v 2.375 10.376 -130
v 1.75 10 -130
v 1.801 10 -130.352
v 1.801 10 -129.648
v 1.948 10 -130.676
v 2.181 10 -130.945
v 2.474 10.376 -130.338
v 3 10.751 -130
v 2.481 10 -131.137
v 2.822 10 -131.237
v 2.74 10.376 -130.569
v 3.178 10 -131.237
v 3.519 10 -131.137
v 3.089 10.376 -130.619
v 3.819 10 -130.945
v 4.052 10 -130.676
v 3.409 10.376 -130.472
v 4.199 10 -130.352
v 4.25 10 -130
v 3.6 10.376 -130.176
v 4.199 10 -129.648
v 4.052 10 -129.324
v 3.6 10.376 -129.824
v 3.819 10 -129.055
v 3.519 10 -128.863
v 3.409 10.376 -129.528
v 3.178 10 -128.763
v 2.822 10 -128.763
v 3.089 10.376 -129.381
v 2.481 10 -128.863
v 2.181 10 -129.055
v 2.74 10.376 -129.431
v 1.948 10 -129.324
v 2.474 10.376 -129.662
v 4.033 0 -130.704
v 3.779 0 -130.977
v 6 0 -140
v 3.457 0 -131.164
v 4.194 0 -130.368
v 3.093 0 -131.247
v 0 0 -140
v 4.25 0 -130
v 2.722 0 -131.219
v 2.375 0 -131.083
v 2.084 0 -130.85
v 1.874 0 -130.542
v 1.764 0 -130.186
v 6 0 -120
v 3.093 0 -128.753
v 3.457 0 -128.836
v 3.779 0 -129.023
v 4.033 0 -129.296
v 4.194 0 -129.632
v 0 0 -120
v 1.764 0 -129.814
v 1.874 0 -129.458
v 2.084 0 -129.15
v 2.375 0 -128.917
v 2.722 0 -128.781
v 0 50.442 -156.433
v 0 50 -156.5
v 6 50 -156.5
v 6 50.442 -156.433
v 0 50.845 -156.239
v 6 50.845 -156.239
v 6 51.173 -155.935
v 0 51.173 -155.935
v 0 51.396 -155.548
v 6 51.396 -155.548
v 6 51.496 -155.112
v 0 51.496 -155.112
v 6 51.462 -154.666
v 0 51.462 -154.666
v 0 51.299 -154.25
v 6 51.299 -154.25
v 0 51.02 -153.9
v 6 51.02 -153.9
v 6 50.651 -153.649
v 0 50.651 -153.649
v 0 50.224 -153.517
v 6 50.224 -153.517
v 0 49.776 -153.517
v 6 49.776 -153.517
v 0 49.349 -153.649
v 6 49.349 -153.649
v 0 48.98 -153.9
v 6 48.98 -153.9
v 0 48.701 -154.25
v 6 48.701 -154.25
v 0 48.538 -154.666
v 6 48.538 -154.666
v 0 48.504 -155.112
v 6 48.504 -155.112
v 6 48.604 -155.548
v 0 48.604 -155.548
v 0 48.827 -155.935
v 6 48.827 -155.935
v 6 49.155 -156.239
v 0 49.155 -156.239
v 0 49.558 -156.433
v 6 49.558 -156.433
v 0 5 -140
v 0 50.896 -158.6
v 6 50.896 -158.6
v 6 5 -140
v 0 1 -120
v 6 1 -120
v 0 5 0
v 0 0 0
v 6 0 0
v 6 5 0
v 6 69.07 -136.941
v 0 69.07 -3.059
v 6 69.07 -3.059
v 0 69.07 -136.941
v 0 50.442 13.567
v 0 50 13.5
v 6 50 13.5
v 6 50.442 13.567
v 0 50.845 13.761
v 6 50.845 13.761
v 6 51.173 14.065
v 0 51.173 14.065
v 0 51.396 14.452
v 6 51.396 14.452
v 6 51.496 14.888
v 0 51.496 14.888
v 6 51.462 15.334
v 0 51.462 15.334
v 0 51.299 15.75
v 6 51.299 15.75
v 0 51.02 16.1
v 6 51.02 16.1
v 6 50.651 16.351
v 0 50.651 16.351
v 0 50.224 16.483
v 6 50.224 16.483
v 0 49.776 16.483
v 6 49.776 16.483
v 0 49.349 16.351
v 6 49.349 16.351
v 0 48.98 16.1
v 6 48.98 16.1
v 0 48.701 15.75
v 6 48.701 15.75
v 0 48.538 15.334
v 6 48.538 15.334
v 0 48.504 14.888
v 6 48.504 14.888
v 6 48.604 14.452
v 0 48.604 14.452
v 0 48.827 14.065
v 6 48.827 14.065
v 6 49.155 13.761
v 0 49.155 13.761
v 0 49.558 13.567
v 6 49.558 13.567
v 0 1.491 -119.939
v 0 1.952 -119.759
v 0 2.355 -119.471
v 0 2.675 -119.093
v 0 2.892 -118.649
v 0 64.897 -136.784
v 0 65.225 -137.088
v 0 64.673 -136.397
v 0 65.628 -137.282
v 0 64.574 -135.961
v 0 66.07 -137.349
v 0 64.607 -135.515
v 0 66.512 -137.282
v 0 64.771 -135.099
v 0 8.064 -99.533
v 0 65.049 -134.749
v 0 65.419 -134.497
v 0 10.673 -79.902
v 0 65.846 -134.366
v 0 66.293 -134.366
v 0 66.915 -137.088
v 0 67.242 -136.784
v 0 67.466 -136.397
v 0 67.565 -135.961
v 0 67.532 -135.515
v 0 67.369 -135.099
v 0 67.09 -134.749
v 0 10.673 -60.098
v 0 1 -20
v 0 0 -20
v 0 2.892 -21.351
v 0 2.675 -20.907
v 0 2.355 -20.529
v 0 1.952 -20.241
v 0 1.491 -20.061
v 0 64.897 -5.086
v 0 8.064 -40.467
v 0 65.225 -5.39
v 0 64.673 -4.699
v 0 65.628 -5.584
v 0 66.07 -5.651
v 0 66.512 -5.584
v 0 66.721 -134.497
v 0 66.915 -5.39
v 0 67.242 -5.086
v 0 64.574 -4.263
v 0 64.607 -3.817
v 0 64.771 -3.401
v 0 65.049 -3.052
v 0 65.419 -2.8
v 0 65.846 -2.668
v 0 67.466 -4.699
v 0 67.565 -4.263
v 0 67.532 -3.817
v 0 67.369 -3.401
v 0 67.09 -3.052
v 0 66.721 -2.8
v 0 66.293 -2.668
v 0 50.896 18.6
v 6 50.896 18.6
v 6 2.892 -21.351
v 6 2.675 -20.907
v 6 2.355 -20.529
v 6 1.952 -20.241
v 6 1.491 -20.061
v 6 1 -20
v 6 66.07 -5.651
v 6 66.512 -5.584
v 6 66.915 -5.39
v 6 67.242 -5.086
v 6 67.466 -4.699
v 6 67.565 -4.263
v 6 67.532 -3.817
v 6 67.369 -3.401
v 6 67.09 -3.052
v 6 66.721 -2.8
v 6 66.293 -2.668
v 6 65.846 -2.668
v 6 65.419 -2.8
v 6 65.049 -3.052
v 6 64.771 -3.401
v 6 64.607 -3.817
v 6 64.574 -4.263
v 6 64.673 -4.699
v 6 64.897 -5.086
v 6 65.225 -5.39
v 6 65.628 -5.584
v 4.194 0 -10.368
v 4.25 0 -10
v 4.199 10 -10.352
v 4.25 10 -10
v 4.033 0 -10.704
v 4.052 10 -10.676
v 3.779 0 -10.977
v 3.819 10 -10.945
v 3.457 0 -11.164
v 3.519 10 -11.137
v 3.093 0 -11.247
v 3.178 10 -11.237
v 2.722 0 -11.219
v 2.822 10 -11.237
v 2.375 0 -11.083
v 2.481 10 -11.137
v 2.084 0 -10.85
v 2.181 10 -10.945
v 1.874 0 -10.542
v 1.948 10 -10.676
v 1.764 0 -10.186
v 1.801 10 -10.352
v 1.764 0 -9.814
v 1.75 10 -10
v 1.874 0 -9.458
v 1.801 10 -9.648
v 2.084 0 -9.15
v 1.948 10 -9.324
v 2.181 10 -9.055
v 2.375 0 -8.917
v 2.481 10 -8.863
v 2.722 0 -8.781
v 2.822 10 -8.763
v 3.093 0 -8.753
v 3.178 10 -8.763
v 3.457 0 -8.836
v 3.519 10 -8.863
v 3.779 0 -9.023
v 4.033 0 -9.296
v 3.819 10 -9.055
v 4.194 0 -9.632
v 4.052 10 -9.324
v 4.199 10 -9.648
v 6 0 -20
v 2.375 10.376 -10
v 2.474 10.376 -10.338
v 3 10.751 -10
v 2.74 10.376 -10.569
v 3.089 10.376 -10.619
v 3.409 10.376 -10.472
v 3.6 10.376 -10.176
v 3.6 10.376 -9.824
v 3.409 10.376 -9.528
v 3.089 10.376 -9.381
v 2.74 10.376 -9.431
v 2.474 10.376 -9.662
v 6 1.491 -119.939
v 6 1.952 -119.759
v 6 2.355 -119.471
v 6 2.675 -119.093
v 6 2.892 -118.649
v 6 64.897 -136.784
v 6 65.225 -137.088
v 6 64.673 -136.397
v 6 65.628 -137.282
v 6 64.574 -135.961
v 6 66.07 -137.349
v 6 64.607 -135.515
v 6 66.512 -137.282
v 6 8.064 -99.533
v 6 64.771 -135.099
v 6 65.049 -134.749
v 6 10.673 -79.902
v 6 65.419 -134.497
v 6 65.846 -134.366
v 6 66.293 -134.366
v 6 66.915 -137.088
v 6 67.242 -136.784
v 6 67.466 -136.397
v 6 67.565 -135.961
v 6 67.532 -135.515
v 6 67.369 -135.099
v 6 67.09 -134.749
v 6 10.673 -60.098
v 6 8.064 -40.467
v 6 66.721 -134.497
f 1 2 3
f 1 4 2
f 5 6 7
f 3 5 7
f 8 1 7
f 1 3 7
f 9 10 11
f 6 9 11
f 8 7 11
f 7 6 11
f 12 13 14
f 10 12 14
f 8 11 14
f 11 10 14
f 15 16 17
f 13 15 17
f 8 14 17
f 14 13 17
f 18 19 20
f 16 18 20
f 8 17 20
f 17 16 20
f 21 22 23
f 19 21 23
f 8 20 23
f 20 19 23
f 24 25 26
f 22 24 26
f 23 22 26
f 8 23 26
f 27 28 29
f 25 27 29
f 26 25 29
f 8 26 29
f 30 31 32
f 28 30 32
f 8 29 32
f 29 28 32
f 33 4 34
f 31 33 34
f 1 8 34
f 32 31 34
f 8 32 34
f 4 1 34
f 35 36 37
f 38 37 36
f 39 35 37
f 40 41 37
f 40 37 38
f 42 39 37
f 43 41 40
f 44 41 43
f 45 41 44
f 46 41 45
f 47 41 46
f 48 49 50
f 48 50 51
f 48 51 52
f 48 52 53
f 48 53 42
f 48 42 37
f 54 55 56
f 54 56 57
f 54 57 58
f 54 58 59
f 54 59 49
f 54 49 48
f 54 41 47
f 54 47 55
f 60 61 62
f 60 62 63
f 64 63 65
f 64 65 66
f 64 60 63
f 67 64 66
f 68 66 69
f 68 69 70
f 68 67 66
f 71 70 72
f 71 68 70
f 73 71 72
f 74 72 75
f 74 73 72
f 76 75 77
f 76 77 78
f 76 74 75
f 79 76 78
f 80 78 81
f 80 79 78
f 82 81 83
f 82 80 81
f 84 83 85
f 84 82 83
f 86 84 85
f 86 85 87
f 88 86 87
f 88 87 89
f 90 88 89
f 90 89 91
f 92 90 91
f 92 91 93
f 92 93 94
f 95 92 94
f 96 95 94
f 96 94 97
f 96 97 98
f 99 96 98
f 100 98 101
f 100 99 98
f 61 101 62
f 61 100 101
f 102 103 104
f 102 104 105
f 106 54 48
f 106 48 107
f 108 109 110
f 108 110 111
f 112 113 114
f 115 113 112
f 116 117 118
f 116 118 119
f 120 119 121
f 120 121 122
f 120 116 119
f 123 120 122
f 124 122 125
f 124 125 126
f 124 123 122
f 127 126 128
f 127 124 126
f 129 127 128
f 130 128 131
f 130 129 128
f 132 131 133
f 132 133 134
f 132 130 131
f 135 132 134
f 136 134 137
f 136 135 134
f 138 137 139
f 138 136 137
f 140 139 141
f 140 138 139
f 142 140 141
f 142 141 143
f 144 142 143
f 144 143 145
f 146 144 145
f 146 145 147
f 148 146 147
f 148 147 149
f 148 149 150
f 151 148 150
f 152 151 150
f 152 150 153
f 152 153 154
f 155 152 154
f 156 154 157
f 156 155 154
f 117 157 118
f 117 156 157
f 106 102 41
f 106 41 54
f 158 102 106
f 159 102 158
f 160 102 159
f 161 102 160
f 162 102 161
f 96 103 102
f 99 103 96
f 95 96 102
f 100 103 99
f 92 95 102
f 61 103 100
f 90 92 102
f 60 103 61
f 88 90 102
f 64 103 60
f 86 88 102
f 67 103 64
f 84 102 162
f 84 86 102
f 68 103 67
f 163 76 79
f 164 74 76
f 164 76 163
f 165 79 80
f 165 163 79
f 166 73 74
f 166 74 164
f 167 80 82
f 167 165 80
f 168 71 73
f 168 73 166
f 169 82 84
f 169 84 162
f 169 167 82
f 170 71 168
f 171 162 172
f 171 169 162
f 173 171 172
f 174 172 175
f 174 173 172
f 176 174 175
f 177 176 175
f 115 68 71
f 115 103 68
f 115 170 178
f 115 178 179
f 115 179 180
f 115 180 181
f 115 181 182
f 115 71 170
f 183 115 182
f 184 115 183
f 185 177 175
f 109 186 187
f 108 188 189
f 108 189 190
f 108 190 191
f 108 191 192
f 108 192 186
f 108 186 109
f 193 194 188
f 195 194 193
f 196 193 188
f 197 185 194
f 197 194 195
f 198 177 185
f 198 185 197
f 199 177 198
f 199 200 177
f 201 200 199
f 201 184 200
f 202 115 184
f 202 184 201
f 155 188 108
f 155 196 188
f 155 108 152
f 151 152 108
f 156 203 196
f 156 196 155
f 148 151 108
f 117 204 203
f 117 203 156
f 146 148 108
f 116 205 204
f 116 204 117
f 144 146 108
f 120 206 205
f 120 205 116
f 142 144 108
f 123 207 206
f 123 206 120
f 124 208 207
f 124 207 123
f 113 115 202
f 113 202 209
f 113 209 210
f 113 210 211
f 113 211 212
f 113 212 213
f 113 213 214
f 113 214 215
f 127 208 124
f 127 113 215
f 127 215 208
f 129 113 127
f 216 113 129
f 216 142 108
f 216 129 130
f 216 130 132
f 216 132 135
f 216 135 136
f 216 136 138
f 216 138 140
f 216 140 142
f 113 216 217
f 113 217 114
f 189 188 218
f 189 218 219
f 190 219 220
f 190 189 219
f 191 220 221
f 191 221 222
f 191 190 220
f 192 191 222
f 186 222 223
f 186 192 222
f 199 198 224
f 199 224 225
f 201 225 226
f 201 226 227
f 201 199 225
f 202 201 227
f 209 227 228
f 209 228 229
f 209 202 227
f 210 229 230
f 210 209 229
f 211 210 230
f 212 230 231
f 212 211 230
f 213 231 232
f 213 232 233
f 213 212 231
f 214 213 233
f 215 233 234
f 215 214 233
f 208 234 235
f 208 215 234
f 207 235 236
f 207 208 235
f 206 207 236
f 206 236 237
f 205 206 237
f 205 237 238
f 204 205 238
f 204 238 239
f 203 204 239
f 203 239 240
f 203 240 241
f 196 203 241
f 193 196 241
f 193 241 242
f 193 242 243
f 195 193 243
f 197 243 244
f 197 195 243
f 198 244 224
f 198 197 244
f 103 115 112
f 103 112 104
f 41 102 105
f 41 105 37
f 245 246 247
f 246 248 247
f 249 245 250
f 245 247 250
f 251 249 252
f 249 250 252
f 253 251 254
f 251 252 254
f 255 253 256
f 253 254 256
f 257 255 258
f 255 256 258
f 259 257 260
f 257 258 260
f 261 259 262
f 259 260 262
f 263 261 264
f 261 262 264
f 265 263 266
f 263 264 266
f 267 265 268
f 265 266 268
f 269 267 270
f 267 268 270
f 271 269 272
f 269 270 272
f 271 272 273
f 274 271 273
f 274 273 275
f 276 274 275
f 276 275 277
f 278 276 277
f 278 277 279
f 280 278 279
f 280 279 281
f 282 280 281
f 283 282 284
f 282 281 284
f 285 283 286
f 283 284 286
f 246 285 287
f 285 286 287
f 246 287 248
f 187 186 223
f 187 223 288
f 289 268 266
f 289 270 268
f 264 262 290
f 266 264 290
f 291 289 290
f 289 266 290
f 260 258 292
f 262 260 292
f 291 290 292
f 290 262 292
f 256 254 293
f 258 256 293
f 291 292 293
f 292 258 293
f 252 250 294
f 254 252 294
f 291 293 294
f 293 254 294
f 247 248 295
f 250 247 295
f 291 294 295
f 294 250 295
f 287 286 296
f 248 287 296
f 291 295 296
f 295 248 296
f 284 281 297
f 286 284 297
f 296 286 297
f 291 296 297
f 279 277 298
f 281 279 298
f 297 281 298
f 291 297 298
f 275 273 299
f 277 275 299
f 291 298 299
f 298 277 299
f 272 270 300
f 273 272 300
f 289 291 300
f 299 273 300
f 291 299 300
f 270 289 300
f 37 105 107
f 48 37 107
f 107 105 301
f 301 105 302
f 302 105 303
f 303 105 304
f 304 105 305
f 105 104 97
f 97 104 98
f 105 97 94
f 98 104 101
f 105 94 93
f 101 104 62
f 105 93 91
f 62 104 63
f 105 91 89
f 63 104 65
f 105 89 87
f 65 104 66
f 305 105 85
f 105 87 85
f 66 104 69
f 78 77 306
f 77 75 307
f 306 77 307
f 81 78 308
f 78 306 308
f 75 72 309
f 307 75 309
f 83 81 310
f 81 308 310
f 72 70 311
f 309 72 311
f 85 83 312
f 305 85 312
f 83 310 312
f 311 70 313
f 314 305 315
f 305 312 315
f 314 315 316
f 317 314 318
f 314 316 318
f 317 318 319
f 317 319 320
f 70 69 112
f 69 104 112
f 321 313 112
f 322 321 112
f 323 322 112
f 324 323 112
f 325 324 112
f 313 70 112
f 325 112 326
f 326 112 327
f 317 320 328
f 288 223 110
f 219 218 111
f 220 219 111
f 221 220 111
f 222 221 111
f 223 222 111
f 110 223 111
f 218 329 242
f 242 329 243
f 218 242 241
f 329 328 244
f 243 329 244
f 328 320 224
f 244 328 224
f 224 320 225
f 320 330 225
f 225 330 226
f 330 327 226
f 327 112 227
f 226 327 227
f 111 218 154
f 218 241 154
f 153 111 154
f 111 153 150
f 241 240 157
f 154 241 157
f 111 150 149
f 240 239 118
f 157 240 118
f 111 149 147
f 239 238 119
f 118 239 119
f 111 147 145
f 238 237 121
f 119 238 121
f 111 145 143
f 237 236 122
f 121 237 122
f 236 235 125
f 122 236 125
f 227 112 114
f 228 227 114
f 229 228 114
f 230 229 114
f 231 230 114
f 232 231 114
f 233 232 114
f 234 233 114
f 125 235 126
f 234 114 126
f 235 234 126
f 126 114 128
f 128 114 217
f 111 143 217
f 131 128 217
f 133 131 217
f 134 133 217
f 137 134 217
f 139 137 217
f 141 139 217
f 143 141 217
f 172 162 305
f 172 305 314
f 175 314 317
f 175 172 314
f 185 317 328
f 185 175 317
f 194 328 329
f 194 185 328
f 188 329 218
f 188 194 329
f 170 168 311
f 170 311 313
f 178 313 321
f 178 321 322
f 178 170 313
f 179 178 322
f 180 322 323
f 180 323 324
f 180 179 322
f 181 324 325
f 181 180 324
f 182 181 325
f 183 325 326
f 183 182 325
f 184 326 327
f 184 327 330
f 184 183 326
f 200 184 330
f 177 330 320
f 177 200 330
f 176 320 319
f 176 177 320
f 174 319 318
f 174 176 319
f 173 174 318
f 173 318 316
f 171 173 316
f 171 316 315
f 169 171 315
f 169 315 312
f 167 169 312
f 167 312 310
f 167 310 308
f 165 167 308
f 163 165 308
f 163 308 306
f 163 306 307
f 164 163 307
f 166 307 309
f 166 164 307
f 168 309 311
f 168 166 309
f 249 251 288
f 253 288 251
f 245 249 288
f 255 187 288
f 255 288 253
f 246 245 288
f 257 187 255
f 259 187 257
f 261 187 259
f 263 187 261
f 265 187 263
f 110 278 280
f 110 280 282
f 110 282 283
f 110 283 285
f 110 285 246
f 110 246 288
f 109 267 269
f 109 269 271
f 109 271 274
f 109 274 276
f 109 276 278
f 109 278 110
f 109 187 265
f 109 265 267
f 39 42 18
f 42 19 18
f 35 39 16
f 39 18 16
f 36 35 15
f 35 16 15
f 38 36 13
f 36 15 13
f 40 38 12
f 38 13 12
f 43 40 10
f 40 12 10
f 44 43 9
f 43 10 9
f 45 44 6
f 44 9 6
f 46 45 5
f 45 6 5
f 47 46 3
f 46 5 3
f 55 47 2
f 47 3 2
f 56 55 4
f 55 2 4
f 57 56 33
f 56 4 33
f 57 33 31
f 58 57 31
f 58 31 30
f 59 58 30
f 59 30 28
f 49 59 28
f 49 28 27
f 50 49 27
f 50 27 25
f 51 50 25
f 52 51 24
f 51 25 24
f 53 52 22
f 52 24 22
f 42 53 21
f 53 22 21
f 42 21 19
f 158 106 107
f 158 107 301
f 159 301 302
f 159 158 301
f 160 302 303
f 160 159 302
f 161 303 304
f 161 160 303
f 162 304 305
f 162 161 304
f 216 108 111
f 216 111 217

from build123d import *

# Parameters (mm, degrees)
SKETCH1_R                   = 1.5
BOSS_EXTRUDE1_DEPTH         = 6
TAP_DRILL_FOR_M3_TAP1_D     = 2.5
TAP_DRILL_FOR_M3_TAP1_DEPTH = 10
TAP_DRILL_FOR_M3_TAP1_TIP   = 0.751075774


with BuildPart() as part:
    # Sketch1 → Boss-Extrude1 (new body)
    with BuildSketch(Plane(origin=(0, 0, 0), x_dir=(0, 0, -1), z_dir=(1, 0, 0))):
        with BuildLine():
            Line((0, 0), (0, 5))
            Line((0, 5), (-18.599926487, 50.895524881))
            Line((-18.599926487, 50.895524881), (3.059200375, 69.069690242))
            Line((3.059200375, 69.069690242), (136.940799625, 69.069690242))
            Line((136.940799625, 69.069690242), (158.599926487, 50.895524881))
            Line((158.599926487, 50.895524881), (140, 5))
            Line((140, 5), (140, 0))
            Line((140, 0), (120, 0))
            Line((120, 0), (120, 1))
            ThreePointArc((120, 1), (119.627466942, 2.162476387), (118.648648649, 2.891891892))
            ThreePointArc((118.648648649, 2.891891892), (70, 11), (21.351351351, 2.891891892))
            ThreePointArc((21.351351351, 2.891891892), (20.372533058, 2.162476387), (20, 1))
            Line((20, 1), (20, 0))
            Line((20, 0), (0, 0))
        make_face()
        with Locations((-15, 50)):
            Circle(SKETCH1_R, mode=Mode.SUBTRACT)
        with Locations((155, 50)):
            Circle(SKETCH1_R, mode=Mode.SUBTRACT)
        with Locations((4.151111078, 66.069690242)):
            Circle(SKETCH1_R, mode=Mode.SUBTRACT)
        with Locations((135.848888922, 66.069690242)):
            Circle(SKETCH1_R, mode=Mode.SUBTRACT)
    extrude(amount=BOSS_EXTRUDE1_DEPTH)

    # Tap Drill for M3 Tap1
    with Locations(Plane(origin=(0, 0, 0), x_dir=(-1, 0, 0), z_dir=(0, -1, 0))):
        with Locations((-3, 10), (-3, 130)):
            Hole(TAP_DRILL_FOR_M3_TAP1_D / 2, depth=TAP_DRILL_FOR_M3_TAP1_DEPTH)
            with Locations((0, 0, -(TAP_DRILL_FOR_M3_TAP1_DEPTH + TAP_DRILL_FOR_M3_TAP1_TIP / 2))):  # 118° drill point
                Cone(0, TAP_DRILL_FOR_M3_TAP1_D / 2, TAP_DRILL_FOR_M3_TAP1_TIP, mode=Mode.SUBTRACT)


solid = part.part
